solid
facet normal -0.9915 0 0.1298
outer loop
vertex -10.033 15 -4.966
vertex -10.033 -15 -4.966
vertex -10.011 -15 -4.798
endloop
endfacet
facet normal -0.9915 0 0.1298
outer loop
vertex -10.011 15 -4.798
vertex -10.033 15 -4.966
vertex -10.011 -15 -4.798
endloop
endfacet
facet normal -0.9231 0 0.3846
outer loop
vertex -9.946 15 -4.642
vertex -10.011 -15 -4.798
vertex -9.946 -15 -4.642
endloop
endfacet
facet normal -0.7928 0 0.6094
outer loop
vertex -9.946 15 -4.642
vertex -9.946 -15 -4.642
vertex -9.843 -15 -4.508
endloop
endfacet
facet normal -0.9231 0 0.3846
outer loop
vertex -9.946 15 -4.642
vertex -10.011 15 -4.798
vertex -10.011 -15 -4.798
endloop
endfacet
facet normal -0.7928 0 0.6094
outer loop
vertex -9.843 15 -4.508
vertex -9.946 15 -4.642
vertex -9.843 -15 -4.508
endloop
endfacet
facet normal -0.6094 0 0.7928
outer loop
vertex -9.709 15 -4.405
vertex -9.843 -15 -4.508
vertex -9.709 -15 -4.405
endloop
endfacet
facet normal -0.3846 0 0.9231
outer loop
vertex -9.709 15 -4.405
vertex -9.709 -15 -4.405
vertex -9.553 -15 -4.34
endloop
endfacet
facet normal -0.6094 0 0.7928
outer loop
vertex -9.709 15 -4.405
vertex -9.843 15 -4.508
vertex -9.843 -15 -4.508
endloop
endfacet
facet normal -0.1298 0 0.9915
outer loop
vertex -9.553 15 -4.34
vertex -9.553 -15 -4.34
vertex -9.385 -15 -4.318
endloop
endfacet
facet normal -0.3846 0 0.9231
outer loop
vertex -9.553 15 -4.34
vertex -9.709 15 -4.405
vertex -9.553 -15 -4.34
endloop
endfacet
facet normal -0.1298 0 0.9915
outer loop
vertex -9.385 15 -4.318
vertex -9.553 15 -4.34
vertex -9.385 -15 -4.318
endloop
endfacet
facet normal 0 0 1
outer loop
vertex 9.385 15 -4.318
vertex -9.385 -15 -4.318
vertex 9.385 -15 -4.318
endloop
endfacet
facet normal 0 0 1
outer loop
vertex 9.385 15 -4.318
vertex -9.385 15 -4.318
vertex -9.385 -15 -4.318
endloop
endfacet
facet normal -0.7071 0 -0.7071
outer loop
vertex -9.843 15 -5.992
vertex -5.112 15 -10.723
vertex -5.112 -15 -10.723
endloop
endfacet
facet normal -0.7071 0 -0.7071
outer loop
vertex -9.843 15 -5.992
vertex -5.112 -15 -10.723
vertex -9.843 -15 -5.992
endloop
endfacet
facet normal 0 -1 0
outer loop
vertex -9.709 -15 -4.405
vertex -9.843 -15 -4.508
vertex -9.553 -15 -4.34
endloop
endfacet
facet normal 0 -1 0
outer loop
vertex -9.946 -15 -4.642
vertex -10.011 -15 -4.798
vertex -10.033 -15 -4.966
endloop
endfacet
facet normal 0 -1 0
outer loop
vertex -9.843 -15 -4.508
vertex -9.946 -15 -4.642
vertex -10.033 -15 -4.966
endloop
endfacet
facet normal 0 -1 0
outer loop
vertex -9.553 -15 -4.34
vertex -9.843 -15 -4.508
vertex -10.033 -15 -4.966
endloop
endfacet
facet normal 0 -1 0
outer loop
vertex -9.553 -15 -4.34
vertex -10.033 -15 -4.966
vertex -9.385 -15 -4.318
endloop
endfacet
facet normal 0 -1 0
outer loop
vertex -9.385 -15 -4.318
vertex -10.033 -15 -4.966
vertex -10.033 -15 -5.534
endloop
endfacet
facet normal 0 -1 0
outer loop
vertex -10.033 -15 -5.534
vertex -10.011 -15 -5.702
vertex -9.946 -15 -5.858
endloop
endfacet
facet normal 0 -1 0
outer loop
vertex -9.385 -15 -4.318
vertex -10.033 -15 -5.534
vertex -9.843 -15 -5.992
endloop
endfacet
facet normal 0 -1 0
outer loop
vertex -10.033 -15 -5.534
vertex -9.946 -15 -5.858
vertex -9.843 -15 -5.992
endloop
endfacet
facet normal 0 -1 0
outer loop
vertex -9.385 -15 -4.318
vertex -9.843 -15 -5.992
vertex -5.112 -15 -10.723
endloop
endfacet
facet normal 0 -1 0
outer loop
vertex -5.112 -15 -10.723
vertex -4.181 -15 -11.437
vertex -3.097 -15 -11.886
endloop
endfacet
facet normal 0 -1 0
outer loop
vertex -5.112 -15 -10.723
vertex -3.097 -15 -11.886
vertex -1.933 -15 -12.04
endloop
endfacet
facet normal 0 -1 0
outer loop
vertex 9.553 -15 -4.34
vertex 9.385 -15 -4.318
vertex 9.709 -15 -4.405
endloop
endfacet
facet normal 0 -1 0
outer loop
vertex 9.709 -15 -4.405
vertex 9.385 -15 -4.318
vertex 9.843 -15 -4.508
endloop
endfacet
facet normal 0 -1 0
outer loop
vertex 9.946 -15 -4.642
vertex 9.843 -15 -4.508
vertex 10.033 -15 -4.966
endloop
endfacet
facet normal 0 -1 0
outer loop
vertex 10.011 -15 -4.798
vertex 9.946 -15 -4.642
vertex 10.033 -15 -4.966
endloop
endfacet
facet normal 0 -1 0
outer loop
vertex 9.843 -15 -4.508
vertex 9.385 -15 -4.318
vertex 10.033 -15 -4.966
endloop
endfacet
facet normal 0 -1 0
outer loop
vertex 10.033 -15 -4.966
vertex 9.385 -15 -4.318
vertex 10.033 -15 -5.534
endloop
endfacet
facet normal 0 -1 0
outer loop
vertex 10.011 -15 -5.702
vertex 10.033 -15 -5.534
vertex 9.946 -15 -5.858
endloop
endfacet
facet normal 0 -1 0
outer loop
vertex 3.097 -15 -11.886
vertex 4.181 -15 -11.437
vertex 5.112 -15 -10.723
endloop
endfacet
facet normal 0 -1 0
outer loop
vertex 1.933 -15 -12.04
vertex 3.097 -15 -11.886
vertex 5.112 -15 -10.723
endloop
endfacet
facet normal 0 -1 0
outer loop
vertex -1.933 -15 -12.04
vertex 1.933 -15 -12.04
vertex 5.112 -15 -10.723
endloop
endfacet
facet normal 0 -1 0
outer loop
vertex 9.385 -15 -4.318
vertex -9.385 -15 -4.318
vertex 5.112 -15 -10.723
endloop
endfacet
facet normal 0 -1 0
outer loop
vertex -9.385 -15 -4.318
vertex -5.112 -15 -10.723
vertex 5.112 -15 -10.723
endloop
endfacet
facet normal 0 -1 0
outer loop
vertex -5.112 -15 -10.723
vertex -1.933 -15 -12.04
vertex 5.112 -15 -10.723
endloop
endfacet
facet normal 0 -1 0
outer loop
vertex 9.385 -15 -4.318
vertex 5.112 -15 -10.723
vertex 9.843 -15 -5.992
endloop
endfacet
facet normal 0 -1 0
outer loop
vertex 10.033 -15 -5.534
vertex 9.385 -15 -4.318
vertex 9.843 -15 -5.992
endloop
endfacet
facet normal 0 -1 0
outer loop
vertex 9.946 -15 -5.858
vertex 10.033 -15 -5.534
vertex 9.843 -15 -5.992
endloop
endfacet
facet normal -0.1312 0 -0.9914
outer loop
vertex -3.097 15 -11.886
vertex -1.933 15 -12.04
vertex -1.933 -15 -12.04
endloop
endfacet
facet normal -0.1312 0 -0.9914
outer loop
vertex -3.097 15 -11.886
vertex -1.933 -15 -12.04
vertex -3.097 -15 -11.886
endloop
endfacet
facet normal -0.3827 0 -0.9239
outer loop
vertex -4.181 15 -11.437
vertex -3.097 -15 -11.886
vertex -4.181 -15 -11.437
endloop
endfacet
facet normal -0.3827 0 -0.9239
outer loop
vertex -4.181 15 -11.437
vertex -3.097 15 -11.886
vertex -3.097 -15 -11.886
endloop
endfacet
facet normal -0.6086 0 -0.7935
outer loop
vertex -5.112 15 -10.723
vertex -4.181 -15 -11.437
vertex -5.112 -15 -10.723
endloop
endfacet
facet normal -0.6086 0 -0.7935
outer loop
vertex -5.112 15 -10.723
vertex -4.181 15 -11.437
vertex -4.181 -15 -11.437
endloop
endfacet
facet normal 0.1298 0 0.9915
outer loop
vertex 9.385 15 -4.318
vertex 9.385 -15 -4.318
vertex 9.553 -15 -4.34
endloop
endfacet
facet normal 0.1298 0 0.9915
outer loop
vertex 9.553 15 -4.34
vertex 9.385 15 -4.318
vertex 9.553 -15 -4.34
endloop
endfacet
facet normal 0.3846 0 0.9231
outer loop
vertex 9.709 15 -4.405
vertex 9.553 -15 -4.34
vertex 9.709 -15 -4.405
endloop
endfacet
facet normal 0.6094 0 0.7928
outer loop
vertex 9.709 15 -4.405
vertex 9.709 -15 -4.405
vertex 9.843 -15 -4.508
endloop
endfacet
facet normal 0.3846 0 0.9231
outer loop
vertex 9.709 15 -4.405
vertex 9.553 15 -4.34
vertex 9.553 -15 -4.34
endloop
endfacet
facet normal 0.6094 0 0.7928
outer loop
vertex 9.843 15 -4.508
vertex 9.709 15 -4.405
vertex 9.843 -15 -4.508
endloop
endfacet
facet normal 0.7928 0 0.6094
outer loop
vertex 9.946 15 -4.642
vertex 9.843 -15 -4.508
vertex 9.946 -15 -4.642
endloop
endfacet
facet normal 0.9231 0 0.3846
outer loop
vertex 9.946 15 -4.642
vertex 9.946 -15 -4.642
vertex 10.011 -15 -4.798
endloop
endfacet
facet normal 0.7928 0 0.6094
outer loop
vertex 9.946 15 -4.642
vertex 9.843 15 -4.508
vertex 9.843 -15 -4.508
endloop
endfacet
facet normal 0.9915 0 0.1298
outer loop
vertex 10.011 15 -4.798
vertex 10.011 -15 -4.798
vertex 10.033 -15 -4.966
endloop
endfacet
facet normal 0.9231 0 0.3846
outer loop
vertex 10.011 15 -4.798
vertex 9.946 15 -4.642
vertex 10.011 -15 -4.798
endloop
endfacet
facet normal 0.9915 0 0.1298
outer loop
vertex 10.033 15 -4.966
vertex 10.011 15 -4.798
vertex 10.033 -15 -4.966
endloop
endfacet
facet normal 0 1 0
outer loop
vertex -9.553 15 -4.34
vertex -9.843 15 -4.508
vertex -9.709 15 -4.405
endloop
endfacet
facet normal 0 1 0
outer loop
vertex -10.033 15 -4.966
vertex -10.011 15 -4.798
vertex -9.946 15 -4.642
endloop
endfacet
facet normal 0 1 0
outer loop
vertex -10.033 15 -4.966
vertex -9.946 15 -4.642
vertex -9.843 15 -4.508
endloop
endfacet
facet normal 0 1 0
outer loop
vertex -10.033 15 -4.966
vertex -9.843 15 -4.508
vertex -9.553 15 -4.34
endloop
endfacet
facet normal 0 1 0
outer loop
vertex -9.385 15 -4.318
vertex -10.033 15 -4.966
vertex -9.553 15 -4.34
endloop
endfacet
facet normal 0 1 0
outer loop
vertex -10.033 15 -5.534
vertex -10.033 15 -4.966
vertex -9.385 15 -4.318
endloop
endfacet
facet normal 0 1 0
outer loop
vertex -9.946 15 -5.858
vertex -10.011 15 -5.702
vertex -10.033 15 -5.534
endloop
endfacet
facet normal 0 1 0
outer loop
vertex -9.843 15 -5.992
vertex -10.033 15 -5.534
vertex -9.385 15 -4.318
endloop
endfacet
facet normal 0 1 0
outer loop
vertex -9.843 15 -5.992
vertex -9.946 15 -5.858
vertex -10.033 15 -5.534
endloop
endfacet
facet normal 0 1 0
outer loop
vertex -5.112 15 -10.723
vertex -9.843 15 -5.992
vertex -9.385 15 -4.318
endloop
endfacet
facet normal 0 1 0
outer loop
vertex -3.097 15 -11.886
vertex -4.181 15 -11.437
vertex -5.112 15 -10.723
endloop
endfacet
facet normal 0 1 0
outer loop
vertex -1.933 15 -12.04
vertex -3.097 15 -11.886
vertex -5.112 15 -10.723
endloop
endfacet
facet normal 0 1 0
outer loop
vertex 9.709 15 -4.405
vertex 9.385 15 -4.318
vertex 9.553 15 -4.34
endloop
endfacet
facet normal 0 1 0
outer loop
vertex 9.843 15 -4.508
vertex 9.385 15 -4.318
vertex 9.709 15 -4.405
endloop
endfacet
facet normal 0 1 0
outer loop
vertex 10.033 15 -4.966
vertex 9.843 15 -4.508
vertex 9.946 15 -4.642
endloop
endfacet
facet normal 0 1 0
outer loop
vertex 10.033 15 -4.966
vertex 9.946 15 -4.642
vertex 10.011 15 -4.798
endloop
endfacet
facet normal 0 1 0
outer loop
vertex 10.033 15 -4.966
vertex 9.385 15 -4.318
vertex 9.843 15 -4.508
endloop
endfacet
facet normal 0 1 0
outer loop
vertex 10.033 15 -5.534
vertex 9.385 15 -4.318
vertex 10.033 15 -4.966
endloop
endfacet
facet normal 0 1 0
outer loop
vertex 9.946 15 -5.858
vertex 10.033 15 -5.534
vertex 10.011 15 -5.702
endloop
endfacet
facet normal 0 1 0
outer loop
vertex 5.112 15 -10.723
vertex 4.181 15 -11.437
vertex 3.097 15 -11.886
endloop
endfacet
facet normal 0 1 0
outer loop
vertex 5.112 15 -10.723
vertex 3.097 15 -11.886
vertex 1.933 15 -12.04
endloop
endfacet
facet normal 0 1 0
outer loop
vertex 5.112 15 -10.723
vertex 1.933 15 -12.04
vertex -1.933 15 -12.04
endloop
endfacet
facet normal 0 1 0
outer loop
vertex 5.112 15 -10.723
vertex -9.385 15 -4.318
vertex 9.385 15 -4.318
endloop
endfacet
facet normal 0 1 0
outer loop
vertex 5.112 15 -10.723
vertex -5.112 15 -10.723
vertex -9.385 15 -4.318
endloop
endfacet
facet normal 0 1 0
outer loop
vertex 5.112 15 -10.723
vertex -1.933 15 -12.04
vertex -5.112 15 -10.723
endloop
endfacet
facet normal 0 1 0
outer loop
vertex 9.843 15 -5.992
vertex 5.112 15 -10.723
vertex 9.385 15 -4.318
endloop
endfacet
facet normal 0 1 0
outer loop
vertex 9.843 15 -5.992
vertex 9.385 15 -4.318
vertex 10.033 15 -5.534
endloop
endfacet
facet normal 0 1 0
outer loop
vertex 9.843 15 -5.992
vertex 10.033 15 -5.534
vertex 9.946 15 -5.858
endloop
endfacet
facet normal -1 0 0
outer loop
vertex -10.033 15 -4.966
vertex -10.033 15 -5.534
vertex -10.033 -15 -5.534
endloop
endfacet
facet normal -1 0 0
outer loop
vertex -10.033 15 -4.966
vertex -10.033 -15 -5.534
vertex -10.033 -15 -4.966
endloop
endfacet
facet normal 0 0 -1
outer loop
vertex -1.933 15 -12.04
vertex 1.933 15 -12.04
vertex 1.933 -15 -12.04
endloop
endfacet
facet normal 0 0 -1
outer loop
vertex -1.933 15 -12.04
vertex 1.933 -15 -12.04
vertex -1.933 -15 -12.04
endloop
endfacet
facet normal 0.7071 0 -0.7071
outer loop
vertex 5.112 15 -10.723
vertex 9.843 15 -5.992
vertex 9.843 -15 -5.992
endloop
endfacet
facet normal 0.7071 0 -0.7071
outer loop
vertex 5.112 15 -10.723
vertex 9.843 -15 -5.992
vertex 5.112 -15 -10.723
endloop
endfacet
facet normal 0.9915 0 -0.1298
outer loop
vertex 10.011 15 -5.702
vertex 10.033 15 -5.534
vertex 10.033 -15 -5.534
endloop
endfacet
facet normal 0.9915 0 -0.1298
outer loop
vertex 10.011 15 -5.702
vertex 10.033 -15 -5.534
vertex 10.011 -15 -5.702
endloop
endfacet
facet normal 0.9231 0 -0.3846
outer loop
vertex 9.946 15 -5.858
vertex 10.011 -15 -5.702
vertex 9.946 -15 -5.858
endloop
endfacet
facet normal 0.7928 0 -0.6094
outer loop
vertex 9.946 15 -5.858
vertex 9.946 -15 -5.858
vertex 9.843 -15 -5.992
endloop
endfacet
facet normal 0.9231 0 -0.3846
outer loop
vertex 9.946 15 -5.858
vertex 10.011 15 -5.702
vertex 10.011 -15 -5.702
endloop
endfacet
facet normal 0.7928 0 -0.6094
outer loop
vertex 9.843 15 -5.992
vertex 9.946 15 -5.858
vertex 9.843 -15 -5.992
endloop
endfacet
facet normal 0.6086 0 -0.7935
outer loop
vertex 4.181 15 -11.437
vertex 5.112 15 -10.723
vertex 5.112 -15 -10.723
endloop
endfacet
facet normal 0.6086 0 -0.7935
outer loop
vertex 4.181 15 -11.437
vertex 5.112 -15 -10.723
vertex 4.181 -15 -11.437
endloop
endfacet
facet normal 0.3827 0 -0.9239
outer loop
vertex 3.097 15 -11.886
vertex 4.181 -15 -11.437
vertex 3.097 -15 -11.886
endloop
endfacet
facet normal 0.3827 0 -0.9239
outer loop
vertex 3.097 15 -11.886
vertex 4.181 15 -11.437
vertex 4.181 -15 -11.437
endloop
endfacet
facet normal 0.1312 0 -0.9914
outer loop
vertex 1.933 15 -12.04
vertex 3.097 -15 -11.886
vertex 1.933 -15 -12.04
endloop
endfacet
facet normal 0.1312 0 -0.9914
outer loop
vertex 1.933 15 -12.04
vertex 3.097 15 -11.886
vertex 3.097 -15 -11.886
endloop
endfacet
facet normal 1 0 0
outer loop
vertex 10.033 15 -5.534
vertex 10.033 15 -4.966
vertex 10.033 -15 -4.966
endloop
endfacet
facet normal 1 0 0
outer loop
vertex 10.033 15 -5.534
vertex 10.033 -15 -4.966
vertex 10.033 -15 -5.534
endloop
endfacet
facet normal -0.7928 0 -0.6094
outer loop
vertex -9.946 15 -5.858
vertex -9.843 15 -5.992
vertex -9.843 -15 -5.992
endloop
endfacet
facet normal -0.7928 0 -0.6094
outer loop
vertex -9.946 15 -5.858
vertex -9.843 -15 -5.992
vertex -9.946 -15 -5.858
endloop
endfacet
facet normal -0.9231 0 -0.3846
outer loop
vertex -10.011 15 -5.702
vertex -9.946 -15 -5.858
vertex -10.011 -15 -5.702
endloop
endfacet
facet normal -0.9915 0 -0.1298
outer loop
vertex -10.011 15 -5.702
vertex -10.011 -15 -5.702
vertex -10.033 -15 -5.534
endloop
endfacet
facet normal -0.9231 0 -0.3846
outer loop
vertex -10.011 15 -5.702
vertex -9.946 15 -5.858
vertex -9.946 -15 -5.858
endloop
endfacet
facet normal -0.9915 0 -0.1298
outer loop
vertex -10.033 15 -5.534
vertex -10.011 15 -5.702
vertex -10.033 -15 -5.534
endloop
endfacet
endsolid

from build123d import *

# Parameters (mm, degrees)
BOSS_EXTRUDE1_DEPTH = 15


with BuildPart() as part:
    # Sketch3 → Boss-Extrude1 (new, symmetric)
    with BuildSketch(Plane(origin=(0, 0, 0), x_dir=(1, 0, 0), z_dir=(0, 1, 0))):
        with BuildLine():
            Line((-5.617617549, 4.318), (5.617617549, 4.318))
            Line((5.617617549, 4.318), (9.385342517, 4.318))
            ThreePointArc((9.385342517, 4.318), (9.843335579, 4.507706938), (10.033042517, 4.9657))
            Line((10.033042517, 4.9657), (10.033042517, 5.533957912))
            ThreePointArc((10.033042517, 5.533957912), (9.983739138, 5.781822339), (9.843335016, 5.991951537))
            Line((9.843335016, 5.991951537), (5.112460341, 10.722814576))
            ThreePointArc((5.112460341, 10.722814576), (3.653919205, 11.69737866), (1.933453584, 12.0396))
            Line((1.933453584, 12.0396), (-1.933453584, 12.0396))
            ThreePointArc((-1.933453584, 12.0396), (-3.653919205, 11.69737866), (-5.112460341, 10.722814576))
            Line((-5.112460341, 10.722814576), (-9.843335016, 5.991951537))
            ThreePointArc((-9.843335016, 5.991951537), (-9.983739138, 5.781822339), (-10.033042517, 5.533957912))
            Line((-10.033042517, 5.533957912), (-10.033042517, 4.9657))
            ThreePointArc((-10.033042517, 4.9657), (-9.843335579, 4.507706938), (-9.385342517, 4.318))
            Line((-9.385342517, 4.318), (-5.617617549, 4.318))
        make_face()
    extrude(amount=BOSS_EXTRUDE1_DEPTH, both=True)


solid = part.part
